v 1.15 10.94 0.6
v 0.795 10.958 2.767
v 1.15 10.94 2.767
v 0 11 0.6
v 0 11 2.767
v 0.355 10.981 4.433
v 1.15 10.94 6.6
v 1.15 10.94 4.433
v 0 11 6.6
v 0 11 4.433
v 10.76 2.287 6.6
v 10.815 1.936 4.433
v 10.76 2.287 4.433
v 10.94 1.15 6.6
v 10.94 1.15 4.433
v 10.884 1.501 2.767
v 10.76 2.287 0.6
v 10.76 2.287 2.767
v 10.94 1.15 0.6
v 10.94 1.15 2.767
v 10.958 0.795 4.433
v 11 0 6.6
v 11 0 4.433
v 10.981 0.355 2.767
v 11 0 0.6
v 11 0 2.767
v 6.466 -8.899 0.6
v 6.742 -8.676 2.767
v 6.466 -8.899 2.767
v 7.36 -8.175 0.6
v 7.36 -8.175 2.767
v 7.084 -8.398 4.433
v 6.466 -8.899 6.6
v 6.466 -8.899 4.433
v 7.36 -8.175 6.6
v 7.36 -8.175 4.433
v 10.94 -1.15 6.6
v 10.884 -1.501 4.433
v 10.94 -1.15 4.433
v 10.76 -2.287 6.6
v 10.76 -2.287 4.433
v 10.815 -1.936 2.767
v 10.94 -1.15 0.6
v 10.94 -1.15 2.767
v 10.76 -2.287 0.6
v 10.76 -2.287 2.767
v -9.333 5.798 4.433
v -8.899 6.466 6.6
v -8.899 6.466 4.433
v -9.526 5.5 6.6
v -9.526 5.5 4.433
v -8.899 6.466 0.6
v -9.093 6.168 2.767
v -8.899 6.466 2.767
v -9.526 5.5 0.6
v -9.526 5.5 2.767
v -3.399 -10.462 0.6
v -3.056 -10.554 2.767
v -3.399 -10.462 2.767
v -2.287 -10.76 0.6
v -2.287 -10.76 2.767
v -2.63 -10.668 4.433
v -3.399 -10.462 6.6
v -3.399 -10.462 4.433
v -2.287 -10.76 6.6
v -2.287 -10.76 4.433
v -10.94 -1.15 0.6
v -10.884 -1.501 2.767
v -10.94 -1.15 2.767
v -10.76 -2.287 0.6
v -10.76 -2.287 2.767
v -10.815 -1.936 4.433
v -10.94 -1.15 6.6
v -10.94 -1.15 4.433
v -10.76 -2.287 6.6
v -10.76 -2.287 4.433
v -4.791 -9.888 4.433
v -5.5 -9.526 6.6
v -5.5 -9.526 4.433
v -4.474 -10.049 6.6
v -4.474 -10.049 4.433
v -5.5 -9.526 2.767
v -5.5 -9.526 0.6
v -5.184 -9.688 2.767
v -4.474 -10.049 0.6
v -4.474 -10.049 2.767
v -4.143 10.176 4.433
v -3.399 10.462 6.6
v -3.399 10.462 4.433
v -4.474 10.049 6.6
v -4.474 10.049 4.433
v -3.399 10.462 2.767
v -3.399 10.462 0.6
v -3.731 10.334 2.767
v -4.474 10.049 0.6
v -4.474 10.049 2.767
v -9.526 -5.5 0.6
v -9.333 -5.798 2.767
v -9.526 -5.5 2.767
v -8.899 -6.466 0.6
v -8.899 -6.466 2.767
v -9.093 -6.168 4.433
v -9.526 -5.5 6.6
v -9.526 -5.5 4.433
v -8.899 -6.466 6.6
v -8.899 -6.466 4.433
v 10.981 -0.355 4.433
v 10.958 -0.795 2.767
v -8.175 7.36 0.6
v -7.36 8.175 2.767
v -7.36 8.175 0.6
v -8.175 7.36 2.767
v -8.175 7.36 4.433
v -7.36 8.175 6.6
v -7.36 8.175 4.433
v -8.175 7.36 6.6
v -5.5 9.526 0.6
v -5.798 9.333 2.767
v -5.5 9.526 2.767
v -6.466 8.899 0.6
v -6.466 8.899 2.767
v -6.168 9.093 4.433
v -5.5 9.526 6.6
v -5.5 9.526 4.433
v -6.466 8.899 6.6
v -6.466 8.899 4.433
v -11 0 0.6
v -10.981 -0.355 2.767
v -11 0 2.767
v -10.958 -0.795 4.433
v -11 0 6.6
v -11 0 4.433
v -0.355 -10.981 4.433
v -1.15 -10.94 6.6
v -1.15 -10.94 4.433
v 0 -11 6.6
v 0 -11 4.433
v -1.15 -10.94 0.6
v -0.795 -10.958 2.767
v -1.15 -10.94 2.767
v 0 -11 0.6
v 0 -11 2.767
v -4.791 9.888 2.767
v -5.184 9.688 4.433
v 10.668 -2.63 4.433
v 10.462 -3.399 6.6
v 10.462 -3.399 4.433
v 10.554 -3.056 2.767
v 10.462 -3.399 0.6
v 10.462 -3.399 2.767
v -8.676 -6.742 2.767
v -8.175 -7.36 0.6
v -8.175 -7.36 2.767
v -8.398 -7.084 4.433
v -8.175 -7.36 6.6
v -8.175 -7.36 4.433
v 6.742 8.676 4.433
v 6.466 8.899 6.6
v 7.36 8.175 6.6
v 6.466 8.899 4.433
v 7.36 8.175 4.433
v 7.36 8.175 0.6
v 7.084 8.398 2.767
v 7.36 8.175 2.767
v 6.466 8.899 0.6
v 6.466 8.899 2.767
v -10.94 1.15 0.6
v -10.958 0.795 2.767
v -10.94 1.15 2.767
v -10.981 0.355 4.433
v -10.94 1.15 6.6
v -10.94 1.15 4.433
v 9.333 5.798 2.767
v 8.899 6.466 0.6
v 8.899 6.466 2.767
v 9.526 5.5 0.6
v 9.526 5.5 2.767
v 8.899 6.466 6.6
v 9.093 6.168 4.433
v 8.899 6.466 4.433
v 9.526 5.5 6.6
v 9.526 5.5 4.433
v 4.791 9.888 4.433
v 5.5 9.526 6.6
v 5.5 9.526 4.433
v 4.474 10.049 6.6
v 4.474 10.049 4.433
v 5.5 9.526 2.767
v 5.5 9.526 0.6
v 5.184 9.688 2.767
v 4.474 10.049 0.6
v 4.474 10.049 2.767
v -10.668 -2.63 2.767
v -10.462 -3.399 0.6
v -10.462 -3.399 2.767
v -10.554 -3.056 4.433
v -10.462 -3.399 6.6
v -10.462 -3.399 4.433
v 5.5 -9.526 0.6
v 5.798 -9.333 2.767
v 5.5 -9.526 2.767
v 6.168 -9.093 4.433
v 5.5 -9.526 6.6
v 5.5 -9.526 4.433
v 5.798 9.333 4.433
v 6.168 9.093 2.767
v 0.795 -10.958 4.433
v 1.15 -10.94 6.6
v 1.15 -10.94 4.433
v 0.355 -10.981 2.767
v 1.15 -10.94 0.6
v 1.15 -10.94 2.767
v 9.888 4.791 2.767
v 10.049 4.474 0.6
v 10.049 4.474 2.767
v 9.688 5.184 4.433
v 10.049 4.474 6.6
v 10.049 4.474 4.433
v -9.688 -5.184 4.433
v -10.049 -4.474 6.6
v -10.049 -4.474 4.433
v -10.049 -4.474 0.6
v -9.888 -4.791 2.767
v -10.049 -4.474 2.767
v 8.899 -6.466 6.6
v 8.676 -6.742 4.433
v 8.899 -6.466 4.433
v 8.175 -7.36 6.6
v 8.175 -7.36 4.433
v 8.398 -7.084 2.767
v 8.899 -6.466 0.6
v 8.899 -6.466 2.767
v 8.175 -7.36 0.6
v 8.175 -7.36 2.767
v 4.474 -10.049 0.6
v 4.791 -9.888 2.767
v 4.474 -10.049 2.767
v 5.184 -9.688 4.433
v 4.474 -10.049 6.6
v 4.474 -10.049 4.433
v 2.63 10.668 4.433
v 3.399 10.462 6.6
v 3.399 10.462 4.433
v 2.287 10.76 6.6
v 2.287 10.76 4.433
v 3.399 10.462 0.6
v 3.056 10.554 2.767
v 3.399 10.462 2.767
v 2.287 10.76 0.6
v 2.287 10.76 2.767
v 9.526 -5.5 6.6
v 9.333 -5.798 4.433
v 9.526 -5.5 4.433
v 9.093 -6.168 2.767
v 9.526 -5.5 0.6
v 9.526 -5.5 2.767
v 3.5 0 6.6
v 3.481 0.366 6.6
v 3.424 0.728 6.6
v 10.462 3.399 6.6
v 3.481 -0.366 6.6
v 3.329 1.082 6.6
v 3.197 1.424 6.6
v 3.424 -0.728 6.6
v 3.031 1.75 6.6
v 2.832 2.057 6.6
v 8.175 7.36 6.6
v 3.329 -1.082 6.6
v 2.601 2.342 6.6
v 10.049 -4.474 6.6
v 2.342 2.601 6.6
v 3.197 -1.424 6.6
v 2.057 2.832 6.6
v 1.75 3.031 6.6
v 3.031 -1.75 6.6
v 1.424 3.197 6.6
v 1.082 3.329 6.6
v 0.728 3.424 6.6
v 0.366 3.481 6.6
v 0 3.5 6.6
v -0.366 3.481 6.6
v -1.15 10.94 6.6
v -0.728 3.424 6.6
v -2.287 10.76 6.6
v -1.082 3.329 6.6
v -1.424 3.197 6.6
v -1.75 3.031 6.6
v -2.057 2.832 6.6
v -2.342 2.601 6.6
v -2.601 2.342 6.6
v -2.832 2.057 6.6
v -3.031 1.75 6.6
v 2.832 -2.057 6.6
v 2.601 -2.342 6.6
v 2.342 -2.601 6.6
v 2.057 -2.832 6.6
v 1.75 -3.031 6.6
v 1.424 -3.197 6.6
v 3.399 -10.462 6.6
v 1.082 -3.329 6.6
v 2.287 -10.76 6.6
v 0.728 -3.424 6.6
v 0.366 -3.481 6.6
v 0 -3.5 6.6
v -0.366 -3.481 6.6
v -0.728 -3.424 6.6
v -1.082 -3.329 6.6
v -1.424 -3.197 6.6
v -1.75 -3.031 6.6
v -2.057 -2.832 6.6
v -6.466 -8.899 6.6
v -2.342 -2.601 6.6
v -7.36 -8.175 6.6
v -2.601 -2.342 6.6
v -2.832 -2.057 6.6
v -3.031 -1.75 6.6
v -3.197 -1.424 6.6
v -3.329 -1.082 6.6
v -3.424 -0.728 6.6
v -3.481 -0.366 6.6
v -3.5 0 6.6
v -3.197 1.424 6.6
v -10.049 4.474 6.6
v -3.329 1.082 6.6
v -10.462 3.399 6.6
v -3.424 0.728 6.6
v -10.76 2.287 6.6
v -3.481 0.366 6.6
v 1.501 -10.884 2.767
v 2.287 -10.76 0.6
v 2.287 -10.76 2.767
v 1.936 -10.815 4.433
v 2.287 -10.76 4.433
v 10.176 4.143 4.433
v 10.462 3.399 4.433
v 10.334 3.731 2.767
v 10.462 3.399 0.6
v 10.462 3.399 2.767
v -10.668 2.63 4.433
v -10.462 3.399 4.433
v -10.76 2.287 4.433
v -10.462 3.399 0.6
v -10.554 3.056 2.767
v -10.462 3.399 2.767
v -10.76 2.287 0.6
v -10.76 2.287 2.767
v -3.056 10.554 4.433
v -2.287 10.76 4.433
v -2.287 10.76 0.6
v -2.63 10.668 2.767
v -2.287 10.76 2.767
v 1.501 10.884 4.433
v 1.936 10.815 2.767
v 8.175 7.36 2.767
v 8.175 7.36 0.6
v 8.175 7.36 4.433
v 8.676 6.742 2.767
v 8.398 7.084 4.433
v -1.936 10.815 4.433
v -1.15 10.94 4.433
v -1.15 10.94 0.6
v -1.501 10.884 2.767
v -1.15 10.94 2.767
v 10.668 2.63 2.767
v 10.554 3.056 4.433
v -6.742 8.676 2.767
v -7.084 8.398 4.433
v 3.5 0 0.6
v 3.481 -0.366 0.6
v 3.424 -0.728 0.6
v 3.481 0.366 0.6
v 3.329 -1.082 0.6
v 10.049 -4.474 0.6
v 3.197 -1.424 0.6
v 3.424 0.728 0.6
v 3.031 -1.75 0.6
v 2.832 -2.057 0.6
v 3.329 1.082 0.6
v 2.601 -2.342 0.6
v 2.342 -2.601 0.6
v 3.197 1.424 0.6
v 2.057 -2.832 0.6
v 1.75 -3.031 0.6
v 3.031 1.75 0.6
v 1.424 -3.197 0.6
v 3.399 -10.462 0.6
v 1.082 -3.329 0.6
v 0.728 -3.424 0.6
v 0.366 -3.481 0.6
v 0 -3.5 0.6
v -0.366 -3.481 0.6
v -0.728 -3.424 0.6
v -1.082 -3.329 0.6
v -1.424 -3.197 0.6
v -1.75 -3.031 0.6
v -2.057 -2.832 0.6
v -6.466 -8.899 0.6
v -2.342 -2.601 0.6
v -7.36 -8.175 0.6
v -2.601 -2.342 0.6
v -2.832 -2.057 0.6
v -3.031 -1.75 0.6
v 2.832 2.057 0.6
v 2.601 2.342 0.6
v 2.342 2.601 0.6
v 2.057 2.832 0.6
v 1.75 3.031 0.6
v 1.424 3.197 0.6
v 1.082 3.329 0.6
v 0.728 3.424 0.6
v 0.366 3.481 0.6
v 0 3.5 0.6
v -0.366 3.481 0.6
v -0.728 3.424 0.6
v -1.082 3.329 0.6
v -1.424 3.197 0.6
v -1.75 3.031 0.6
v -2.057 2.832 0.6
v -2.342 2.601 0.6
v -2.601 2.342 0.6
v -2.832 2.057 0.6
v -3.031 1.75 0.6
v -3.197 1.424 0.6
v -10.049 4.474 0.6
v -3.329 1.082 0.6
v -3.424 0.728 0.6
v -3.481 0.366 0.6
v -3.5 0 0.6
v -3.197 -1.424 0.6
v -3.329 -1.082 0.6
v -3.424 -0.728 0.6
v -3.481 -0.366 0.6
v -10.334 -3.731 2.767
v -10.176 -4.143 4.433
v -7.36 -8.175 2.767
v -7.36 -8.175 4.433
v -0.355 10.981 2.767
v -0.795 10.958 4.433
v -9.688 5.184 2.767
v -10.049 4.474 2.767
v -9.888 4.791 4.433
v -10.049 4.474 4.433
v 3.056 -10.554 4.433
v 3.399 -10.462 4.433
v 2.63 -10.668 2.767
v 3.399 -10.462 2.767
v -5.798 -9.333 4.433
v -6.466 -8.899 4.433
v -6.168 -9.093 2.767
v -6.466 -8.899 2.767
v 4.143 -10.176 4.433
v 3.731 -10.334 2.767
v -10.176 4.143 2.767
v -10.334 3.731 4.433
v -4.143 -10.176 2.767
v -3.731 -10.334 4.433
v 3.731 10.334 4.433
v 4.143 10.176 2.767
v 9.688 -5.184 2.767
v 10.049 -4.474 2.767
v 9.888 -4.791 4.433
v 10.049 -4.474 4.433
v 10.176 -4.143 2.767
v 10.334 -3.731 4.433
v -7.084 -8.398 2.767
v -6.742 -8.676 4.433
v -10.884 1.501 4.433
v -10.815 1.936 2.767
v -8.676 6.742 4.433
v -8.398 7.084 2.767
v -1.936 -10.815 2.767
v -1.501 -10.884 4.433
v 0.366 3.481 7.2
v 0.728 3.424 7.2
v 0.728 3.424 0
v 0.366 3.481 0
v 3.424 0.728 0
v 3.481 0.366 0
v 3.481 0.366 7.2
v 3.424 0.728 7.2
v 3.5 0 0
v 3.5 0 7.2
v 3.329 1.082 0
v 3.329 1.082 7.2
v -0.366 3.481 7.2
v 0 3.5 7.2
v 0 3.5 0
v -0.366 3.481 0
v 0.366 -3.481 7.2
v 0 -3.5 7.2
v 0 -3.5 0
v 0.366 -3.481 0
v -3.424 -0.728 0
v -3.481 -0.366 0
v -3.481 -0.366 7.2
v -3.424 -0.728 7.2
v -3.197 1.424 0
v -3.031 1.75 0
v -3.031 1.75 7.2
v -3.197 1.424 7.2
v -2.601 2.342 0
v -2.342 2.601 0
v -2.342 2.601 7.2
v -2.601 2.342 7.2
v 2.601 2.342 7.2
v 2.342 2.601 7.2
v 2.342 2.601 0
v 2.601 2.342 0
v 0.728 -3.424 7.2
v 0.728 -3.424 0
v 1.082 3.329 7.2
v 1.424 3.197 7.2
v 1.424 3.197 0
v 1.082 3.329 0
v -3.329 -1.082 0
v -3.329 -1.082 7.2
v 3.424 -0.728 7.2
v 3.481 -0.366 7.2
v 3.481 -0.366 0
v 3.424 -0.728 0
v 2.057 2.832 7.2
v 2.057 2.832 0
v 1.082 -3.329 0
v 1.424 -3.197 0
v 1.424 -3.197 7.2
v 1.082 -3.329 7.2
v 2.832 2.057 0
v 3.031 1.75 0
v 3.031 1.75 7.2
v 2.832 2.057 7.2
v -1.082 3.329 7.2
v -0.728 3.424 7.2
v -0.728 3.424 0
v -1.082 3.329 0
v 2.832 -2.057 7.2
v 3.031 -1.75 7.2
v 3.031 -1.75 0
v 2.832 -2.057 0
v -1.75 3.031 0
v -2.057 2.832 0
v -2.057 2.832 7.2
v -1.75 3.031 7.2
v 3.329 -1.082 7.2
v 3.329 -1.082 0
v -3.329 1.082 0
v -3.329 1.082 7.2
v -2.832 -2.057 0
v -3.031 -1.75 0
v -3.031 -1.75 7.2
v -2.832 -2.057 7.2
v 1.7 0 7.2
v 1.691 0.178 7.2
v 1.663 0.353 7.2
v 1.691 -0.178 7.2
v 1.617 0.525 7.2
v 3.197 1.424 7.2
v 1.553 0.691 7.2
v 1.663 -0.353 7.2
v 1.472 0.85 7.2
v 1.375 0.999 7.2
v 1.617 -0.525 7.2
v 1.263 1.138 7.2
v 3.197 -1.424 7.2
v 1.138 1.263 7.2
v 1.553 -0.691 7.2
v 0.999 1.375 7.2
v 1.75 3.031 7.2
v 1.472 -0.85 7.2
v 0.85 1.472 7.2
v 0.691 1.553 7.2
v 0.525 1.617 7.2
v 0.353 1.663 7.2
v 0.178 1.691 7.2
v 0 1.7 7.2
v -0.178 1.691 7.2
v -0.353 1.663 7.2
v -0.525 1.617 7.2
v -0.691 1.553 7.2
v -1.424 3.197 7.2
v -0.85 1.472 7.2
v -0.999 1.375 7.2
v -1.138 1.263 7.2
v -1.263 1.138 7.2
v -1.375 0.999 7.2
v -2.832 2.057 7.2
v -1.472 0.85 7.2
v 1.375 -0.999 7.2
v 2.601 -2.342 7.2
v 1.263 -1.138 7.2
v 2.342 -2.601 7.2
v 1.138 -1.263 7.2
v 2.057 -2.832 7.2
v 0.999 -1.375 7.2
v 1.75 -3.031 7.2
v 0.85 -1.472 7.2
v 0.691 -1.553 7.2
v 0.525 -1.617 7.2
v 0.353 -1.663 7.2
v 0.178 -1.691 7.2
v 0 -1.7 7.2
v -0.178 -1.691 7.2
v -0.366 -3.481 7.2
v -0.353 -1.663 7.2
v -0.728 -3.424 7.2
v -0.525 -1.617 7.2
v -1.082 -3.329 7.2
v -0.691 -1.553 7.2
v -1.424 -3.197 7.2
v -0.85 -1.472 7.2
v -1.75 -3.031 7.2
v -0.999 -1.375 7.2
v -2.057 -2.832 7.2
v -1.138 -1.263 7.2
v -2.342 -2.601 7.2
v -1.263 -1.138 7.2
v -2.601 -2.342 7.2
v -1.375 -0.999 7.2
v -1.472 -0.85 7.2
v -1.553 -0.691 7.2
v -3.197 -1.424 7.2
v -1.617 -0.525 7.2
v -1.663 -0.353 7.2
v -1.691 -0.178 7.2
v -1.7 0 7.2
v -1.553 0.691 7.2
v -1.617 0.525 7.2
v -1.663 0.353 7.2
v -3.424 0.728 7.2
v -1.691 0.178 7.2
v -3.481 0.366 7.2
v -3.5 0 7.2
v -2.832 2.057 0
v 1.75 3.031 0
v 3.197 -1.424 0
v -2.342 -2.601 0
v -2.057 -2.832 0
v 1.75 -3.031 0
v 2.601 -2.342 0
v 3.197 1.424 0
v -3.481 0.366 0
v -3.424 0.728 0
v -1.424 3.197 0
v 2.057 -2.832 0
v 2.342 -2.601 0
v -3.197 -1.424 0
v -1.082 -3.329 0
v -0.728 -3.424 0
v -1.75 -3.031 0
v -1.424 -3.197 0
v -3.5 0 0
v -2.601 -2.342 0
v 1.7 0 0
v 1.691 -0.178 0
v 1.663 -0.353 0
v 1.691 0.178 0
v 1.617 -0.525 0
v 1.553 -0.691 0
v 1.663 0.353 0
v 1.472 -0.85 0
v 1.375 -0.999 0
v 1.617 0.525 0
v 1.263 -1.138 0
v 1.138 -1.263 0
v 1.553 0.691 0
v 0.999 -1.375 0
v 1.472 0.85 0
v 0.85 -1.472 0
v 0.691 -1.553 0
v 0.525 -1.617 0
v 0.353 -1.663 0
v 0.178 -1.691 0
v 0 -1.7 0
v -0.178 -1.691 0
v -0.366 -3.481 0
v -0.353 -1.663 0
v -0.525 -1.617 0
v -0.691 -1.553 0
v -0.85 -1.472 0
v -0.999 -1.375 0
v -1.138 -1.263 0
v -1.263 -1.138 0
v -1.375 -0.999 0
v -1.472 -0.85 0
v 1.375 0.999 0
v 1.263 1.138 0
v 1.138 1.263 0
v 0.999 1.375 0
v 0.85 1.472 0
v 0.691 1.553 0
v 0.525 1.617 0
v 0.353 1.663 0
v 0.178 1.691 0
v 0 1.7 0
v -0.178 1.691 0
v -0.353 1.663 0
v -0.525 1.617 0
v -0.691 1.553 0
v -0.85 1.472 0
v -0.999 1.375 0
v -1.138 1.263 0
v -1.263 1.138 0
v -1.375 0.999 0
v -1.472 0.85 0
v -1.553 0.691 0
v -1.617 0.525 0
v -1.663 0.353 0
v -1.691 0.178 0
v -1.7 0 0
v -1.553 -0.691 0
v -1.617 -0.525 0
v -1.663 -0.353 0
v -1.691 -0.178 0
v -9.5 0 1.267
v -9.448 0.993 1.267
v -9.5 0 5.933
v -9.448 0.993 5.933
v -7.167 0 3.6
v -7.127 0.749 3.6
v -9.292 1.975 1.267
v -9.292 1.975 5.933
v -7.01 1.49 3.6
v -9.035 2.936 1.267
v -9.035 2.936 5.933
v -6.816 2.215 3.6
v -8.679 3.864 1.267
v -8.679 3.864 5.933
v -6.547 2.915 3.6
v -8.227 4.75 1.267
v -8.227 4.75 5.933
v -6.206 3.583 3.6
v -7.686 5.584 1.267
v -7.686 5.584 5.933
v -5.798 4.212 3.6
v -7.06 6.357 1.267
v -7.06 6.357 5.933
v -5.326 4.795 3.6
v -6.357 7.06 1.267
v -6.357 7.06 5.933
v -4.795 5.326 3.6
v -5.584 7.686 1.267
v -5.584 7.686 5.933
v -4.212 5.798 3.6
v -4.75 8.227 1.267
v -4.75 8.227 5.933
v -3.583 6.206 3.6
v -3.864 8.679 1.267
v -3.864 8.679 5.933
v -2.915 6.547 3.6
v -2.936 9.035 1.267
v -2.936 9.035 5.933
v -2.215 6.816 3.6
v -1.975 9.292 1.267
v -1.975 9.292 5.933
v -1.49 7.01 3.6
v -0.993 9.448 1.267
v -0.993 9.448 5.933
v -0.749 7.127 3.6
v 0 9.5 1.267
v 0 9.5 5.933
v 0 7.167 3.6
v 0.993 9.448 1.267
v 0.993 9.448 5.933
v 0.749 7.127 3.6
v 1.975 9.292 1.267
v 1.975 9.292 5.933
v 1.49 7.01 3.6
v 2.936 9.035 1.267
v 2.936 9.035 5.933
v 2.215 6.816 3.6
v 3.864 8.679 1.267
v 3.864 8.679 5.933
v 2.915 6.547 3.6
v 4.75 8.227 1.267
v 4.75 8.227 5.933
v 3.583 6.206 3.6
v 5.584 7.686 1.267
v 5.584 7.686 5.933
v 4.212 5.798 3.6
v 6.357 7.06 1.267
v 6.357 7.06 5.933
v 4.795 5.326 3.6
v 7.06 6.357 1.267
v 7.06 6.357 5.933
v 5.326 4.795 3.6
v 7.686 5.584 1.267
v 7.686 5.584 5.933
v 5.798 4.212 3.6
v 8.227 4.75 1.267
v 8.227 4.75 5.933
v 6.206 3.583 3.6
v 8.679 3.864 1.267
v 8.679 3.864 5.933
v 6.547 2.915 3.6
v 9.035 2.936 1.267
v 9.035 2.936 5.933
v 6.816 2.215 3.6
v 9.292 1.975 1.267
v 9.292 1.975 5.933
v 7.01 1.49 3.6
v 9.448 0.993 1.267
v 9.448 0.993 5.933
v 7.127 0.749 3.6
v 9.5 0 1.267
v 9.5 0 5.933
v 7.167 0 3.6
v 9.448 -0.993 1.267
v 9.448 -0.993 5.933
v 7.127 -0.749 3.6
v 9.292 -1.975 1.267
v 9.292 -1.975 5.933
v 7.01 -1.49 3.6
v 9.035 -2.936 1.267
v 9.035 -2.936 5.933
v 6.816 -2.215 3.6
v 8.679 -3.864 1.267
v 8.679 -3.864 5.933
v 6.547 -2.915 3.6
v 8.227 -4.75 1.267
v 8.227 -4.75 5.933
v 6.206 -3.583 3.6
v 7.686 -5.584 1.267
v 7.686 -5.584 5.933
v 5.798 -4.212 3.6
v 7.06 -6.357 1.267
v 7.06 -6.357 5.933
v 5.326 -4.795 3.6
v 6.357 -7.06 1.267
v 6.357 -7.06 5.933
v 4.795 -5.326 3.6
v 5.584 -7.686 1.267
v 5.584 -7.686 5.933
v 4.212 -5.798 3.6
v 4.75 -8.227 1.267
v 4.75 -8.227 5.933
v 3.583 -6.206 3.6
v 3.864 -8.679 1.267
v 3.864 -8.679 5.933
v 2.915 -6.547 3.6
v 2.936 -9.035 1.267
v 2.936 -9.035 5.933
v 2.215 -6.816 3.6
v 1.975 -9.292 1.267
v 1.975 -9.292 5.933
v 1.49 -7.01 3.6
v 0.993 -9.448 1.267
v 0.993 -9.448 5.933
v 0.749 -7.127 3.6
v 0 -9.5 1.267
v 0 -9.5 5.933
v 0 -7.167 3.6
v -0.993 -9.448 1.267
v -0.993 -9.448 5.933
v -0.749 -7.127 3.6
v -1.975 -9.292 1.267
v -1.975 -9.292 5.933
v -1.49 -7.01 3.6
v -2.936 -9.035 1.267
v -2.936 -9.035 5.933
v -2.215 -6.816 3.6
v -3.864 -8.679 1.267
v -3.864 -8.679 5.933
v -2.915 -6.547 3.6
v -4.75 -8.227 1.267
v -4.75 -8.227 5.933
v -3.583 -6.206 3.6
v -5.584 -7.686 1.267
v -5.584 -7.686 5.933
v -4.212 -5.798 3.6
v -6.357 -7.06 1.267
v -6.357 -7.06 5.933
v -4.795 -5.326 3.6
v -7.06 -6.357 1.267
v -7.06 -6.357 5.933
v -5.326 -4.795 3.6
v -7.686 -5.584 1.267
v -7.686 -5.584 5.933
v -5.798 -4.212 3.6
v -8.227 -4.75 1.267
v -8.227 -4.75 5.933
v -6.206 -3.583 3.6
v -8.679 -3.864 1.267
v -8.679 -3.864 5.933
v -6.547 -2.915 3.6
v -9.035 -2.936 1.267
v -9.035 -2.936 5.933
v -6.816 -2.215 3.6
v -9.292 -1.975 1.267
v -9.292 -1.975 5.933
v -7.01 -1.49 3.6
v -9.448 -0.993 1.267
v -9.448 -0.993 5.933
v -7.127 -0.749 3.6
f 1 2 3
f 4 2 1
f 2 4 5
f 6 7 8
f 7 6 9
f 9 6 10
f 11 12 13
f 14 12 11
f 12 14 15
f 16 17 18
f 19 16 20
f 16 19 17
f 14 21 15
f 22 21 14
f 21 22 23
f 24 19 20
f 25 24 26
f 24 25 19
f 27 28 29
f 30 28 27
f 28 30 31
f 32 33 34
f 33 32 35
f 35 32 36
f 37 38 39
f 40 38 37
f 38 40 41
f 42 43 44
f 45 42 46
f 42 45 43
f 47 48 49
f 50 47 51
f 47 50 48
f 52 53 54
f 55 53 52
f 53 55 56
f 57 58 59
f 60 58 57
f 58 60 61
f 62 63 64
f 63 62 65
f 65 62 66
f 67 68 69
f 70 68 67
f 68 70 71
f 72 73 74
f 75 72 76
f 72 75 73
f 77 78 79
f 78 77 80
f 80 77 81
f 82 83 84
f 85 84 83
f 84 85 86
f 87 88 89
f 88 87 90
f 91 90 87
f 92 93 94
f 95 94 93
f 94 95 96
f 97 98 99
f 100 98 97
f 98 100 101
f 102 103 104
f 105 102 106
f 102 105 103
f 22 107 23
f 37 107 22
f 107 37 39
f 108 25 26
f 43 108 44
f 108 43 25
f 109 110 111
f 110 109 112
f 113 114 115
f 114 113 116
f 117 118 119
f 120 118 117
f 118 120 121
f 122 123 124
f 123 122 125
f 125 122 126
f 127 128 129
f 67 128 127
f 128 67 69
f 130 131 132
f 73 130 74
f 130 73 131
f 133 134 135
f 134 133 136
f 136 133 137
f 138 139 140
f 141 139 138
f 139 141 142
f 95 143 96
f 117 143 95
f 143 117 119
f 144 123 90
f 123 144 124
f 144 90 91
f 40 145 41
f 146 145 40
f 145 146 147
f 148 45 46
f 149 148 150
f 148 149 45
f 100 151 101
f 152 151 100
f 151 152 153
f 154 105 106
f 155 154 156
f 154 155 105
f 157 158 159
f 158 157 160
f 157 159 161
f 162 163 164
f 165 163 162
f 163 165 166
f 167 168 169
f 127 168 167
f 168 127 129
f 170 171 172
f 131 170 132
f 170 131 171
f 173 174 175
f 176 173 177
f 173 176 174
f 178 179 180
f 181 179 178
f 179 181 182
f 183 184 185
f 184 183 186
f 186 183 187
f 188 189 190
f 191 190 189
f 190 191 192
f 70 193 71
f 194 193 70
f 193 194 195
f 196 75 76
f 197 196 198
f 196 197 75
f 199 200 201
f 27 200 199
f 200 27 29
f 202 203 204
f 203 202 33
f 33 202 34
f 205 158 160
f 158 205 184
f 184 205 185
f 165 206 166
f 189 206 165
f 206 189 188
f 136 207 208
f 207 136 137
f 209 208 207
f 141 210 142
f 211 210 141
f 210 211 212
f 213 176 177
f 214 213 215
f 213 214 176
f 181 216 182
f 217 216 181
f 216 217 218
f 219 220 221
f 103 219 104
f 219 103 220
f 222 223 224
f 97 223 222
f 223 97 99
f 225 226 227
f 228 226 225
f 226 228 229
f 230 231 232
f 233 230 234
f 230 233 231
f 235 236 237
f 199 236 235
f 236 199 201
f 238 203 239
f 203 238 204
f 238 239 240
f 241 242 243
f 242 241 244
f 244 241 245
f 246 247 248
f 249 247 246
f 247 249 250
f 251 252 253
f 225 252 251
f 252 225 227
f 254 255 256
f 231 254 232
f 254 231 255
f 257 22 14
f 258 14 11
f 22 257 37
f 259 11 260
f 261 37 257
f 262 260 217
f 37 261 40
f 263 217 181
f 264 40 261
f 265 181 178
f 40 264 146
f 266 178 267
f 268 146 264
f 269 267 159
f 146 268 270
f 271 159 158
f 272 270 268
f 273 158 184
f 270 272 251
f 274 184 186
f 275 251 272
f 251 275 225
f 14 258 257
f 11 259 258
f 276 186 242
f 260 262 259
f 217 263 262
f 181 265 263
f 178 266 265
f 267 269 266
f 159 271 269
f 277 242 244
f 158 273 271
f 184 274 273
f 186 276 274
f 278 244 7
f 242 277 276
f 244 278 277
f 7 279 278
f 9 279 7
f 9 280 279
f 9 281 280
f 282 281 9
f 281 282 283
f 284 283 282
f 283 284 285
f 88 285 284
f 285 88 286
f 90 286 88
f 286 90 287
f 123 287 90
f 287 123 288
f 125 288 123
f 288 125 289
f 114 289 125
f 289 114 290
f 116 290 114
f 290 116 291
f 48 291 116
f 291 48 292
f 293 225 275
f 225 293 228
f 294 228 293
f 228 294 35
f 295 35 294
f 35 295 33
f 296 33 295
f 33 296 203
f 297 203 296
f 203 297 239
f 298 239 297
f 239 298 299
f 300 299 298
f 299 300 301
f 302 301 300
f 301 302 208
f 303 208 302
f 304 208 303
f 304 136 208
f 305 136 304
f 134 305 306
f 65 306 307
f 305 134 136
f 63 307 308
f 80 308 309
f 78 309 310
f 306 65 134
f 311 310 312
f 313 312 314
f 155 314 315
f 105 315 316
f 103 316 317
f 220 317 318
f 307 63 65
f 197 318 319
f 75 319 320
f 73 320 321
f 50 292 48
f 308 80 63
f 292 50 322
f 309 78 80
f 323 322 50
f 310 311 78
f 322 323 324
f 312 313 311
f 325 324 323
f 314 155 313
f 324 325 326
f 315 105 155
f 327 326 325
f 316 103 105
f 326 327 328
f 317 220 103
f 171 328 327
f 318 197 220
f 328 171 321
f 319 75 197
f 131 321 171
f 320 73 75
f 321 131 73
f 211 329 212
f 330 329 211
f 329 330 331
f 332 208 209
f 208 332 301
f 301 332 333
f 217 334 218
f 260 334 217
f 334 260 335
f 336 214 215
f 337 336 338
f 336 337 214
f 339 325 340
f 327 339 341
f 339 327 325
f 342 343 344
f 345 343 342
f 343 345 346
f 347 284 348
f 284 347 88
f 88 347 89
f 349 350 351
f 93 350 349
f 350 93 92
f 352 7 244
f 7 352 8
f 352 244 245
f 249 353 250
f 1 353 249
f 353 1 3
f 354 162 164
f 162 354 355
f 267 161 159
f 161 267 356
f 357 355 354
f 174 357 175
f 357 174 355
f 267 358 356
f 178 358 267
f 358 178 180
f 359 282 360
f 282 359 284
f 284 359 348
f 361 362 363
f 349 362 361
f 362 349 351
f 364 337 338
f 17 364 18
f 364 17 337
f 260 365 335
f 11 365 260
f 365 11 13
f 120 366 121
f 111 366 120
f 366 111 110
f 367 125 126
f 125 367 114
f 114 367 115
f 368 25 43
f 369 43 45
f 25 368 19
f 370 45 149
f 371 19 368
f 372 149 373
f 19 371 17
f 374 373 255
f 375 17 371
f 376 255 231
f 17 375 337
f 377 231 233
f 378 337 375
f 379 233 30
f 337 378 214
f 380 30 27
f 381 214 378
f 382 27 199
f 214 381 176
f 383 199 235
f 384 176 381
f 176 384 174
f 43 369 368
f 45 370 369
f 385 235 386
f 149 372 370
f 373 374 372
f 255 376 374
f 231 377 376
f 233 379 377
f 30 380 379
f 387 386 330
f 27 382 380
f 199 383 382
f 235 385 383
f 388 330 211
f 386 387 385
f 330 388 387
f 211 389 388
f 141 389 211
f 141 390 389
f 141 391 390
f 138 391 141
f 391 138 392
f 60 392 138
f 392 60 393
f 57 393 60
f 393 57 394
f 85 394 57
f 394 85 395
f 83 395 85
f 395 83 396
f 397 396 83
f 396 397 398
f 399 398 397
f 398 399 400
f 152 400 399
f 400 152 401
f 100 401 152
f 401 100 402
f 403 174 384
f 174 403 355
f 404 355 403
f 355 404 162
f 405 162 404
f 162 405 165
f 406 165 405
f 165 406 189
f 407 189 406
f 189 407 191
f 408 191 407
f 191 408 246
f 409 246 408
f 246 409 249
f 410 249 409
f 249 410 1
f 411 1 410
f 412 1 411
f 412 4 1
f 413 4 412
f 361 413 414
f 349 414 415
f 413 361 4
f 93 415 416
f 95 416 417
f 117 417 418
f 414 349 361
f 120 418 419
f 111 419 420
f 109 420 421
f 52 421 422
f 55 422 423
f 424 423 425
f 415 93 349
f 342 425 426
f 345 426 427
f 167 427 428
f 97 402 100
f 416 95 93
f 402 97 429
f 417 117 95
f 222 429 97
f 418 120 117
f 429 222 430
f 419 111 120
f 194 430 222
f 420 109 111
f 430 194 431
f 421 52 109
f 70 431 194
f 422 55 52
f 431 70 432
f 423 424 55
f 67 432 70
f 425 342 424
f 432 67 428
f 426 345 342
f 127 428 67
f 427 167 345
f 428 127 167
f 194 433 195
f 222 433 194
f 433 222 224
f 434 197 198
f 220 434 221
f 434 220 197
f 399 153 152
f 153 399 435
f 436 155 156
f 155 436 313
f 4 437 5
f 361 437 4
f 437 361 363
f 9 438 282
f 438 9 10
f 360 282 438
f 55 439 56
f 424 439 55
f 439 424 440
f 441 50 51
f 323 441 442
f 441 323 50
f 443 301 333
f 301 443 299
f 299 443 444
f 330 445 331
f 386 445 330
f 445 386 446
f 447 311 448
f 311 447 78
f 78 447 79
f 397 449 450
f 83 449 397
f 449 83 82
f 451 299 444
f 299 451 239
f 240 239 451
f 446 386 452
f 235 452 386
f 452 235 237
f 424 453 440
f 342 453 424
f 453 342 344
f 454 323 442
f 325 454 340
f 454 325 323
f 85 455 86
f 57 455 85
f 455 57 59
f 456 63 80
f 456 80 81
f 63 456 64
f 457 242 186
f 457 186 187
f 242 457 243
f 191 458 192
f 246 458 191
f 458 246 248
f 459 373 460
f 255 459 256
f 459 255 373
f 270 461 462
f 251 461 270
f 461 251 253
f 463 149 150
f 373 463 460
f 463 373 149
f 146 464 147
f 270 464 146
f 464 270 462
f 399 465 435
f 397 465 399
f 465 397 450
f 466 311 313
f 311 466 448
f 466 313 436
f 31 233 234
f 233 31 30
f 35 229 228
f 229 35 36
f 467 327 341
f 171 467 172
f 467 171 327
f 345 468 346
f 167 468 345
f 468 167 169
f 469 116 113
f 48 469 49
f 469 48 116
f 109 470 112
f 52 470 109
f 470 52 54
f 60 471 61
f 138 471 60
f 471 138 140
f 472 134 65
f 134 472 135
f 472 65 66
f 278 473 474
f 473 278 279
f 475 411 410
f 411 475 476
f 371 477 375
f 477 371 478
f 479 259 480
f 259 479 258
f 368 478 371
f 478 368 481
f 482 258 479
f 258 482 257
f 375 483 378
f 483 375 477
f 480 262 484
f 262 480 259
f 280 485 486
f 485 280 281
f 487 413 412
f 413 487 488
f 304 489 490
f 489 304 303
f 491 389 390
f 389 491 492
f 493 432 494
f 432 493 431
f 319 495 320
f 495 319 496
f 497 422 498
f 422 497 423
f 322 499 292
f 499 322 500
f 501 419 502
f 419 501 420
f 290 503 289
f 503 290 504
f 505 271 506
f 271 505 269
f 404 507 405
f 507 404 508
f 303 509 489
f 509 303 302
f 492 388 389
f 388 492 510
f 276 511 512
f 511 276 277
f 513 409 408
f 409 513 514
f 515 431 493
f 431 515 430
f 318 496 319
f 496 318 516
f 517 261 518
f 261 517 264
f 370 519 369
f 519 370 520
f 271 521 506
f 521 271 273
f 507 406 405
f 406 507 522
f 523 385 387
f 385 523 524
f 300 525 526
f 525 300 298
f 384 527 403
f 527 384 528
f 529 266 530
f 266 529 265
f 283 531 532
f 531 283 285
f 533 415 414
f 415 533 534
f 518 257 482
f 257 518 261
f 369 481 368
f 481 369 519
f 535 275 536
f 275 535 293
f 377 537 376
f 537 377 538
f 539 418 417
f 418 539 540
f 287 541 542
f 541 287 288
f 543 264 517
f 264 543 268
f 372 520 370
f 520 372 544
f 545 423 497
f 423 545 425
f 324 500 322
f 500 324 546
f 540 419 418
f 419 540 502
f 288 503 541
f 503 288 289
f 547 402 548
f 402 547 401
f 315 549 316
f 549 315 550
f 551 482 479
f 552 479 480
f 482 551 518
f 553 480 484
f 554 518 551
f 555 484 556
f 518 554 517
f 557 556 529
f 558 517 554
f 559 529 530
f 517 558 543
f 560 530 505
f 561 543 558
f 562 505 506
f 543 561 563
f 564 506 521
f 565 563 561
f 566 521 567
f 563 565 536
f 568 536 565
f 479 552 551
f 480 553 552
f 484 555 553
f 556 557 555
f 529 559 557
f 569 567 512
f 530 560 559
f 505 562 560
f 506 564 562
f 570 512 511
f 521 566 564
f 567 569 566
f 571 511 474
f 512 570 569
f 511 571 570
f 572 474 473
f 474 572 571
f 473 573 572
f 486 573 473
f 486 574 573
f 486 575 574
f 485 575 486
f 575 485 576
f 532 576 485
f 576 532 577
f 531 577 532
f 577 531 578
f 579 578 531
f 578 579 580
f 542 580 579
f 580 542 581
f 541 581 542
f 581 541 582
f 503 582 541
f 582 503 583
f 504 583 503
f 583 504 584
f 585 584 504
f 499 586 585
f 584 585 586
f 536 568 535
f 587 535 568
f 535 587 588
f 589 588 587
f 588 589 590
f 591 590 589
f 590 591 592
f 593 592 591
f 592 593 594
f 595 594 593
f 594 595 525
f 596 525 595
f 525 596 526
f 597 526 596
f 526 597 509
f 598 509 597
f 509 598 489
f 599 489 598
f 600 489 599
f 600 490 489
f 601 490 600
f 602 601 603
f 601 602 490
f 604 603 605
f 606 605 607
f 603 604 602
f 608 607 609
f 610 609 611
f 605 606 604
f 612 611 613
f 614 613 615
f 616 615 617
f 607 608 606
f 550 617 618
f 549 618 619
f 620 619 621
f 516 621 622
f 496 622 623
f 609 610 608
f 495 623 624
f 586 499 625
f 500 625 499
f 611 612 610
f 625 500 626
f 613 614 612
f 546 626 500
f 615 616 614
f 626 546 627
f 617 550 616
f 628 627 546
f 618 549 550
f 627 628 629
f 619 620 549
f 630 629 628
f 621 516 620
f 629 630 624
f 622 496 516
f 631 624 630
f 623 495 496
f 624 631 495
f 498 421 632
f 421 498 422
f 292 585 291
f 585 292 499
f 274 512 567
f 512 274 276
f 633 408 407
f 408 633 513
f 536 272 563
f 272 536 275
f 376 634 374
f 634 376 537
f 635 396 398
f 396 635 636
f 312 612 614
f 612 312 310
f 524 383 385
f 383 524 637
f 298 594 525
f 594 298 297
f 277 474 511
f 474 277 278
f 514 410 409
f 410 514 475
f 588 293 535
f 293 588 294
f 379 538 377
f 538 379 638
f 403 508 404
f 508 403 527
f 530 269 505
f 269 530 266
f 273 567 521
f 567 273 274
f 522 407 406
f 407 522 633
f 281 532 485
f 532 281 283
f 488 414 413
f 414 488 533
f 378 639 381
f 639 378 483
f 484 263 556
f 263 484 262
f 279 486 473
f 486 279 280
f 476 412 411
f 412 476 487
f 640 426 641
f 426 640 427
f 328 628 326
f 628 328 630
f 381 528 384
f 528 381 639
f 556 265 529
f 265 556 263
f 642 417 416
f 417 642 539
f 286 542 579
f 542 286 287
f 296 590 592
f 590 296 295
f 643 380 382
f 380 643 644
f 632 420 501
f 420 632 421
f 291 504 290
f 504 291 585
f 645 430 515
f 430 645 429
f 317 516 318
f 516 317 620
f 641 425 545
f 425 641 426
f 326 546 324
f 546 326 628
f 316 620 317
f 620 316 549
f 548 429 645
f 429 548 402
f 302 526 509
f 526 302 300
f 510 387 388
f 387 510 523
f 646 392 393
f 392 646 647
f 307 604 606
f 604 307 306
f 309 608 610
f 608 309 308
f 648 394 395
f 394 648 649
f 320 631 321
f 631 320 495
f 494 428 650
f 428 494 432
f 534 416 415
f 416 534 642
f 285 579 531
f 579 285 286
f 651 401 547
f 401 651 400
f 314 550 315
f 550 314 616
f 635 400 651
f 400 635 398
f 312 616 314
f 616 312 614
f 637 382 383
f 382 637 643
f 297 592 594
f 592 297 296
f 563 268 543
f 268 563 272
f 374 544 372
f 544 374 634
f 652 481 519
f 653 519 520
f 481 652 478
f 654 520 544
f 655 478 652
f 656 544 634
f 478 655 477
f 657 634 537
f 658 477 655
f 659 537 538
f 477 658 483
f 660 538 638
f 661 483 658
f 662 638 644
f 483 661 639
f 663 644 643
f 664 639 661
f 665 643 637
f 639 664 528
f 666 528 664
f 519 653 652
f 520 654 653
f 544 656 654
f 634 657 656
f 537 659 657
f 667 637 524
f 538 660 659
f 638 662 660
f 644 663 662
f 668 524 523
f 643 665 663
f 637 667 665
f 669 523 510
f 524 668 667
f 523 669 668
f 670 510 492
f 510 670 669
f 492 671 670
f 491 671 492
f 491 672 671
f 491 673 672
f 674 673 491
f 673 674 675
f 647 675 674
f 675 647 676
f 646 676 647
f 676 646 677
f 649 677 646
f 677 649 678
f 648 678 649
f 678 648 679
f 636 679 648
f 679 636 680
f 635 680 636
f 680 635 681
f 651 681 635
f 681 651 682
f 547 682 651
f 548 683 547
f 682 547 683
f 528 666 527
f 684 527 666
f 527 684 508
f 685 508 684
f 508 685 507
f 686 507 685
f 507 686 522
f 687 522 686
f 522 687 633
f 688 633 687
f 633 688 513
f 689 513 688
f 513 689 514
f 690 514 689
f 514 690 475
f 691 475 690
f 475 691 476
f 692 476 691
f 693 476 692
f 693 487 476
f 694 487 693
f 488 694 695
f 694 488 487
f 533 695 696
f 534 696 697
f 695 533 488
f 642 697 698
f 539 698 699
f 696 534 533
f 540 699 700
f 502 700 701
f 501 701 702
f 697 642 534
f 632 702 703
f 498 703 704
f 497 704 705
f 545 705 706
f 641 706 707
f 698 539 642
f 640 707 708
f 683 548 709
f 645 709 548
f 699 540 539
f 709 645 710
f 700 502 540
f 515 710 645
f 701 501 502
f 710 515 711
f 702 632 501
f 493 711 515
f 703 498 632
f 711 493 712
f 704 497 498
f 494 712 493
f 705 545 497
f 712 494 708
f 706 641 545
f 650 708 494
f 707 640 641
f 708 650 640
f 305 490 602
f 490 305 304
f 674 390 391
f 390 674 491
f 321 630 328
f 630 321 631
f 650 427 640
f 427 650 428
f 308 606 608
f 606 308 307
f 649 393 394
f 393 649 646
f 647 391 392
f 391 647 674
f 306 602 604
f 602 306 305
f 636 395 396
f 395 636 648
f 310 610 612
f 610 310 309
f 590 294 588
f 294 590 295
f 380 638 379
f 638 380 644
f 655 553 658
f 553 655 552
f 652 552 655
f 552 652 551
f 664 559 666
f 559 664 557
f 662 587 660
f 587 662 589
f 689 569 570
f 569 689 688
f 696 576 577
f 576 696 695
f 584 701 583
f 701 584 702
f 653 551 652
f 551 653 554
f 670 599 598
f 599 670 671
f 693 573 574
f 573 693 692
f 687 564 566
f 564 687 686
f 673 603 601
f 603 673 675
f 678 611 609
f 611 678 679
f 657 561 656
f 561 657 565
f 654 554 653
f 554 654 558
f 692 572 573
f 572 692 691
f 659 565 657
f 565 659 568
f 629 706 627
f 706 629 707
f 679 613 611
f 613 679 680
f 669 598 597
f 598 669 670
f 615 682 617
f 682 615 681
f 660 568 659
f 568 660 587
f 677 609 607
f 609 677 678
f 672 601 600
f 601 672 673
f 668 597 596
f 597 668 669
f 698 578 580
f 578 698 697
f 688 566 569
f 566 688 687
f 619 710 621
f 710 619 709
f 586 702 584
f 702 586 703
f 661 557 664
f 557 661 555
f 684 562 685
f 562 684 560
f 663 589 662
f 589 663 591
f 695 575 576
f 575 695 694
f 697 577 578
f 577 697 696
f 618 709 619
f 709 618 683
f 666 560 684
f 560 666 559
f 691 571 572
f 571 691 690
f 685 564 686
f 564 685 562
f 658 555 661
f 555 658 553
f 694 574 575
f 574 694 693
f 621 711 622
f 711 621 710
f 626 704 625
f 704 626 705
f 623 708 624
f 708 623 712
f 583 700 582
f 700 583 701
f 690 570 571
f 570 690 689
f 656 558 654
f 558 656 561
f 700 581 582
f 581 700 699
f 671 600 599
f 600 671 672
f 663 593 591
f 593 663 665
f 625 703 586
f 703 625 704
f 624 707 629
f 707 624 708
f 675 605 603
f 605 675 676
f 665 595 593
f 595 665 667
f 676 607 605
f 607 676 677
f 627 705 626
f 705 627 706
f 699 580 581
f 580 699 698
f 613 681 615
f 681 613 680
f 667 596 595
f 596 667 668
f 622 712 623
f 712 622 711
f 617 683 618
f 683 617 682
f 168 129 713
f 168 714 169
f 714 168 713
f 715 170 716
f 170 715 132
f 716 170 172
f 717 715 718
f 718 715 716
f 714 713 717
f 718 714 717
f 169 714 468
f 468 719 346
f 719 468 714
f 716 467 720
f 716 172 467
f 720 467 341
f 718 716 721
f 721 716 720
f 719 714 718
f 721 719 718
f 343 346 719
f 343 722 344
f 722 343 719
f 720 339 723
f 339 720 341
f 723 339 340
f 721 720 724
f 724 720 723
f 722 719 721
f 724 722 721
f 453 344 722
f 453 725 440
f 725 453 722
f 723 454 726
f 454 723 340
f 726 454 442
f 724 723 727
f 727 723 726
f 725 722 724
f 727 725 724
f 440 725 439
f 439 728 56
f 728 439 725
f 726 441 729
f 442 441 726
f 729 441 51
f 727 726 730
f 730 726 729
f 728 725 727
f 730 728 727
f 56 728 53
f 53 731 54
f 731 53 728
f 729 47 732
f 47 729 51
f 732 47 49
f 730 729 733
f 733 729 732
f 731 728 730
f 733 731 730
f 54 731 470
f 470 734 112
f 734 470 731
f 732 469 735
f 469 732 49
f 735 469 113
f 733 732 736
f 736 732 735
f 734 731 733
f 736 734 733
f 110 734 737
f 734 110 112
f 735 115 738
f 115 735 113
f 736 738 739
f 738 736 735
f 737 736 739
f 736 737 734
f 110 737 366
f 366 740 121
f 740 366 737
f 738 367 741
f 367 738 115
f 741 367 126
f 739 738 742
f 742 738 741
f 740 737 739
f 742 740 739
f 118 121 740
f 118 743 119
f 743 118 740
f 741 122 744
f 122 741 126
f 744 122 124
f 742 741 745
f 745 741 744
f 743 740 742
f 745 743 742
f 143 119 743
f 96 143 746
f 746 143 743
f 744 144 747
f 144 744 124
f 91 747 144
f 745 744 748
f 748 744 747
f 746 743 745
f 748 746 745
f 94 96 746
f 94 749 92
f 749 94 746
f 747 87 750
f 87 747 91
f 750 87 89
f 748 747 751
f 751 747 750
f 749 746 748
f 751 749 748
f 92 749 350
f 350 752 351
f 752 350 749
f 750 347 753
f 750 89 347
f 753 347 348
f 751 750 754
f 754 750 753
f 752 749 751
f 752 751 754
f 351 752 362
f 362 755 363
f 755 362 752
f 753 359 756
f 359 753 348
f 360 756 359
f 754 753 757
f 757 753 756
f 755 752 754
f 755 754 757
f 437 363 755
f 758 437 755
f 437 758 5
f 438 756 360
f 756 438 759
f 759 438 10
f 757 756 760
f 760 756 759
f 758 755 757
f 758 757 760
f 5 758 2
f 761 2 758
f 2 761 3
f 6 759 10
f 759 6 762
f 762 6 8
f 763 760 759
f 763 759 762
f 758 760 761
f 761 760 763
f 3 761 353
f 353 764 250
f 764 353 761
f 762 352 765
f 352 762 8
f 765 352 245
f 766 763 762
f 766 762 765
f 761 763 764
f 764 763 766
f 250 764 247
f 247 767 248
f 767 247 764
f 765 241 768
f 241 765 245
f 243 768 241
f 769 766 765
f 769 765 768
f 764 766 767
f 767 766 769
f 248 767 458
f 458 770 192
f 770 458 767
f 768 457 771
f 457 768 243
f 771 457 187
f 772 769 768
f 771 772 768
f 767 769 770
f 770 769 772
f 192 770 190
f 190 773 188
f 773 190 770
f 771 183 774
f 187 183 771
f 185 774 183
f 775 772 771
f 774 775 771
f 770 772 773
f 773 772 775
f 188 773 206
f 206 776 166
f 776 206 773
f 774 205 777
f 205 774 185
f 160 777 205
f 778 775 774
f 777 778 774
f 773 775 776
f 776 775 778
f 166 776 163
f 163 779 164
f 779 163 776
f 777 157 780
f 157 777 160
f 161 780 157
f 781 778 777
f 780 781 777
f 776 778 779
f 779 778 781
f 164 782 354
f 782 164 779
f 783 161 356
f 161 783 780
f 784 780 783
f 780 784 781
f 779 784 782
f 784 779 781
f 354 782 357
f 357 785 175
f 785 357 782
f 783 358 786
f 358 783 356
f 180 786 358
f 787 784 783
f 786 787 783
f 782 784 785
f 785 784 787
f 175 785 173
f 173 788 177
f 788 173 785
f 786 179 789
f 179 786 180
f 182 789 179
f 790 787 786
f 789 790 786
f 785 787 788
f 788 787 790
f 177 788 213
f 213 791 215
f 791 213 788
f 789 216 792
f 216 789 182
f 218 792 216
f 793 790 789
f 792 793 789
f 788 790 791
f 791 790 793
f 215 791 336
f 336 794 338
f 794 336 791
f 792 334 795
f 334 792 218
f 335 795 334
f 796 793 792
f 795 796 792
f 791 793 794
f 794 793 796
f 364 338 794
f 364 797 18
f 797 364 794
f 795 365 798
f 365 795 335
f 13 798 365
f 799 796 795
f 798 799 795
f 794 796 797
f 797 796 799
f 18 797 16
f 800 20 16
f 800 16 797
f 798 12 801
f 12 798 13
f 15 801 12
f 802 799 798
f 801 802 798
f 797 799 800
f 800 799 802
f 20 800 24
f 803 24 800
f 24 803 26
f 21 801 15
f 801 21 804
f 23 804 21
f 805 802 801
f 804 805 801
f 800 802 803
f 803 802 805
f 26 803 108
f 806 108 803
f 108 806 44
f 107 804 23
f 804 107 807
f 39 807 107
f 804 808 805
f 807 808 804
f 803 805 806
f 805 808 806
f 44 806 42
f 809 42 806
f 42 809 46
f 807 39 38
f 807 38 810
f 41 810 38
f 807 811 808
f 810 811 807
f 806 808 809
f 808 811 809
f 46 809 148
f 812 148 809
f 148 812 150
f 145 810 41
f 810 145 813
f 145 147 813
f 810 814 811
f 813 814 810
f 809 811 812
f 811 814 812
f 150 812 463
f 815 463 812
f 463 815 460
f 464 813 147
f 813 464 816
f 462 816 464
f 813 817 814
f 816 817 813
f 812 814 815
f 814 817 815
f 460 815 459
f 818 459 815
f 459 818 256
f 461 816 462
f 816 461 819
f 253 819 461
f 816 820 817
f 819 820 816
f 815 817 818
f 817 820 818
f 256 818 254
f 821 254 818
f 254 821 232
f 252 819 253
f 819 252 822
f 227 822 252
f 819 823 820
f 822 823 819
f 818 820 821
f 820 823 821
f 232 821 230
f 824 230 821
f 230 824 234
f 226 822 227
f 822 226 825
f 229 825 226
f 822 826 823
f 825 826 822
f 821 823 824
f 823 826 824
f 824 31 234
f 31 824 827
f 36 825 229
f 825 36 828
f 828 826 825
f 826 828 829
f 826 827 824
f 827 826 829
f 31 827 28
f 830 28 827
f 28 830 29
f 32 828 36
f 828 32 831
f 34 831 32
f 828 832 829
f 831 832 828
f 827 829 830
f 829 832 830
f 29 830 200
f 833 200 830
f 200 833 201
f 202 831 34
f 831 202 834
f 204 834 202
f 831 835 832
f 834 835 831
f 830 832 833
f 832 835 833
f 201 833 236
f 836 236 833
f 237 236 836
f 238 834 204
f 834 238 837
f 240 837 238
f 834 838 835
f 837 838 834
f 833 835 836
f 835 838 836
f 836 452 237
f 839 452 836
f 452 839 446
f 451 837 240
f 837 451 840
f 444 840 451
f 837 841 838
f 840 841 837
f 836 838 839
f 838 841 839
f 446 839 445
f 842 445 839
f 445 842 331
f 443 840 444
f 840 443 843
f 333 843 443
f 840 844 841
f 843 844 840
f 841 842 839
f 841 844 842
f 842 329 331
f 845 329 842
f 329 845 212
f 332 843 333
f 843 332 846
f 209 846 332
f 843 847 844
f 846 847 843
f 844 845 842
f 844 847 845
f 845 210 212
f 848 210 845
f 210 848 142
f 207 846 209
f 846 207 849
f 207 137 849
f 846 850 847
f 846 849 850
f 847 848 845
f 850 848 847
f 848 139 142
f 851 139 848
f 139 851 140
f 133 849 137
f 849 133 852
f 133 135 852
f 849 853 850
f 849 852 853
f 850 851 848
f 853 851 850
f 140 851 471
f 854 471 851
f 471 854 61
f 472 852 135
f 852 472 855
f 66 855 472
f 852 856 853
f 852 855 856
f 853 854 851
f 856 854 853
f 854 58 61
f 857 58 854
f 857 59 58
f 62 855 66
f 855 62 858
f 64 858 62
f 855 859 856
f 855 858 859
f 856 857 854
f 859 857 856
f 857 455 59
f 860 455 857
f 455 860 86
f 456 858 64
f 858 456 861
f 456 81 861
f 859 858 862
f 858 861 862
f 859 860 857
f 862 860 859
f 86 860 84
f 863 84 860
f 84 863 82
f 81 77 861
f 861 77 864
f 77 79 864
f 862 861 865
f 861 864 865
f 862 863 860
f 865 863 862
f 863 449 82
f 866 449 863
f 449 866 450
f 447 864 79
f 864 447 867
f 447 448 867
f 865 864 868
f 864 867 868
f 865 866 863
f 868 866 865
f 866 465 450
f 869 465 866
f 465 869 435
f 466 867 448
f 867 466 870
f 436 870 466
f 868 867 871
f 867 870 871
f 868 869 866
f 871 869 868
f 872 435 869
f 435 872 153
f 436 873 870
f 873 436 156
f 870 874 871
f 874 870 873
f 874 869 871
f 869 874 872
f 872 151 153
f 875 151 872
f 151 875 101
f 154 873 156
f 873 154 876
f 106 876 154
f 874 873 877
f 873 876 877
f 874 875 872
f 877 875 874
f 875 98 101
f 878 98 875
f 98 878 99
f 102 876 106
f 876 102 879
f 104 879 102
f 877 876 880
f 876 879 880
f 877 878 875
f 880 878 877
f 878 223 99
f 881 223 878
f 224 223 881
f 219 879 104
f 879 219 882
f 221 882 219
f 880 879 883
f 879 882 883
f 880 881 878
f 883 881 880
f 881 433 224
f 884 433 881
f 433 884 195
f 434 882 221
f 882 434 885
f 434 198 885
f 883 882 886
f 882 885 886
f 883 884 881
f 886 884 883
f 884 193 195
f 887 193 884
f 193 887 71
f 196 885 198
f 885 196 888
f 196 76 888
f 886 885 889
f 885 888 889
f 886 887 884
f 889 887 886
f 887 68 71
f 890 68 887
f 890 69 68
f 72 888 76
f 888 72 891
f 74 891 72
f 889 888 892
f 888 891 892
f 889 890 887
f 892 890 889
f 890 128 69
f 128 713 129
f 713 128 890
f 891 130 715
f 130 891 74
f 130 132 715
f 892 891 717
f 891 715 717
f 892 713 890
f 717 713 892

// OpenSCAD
// ====================================================================
// Trolley Roller Wheel (100% 3D-Printable - Flat on Bed at Z = 0)
// Grooved sheave designed to roll directly on a 1.0 - 2.0 mm cable line.
// Spins freely on a standard M3 or M4 screw / pin axle.
// ====================================================================

$fn = 60; // Smooth curve resolution

// Parameters
wheel_outer_dia   = 22.0; // Outer flange diameter (mm)
groove_root_dia   = 16.0; // Bottom of groove diameter (mm)
wheel_thickness   = 6.0;  // Total thickness along axle (mm)
groove_width      = 3.0;  // Width of cable track (mm)
axle_hole_dia     = 3.4;  // Fits standard M3 screw with clearance
hub_lip_extension = 0.6;  // Built-in standoff hub so wheel faces don't rub on carriage walls
hub_dia           = 7.0;  // Diameter of built-in standoff spacer

total_wheel_h = wheel_thickness + (hub_lip_extension * 2);

module trolley_wheel_body(od = wheel_outer_dia, root_d = groove_root_dia, th = wheel_thickness, axle_d = axle_hole_dia) {
    difference() {
        union() {
            // Main wheel body
            translate([0, 0, hub_lip_extension])
                cylinder(d = od, h = th);
            // Built-in hub spacers on both sides (starts at Z = 0)
            cylinder(d = hub_dia, h = th + (hub_lip_extension * 2));
        }
        
        // Central axle bore
        translate([0, 0, -1])
            cylinder(d = axle_d, h = th + (hub_lip_extension * 2) + 2);
        
        // Deep V/U Cable groove around the perimeter
        translate([0, 0, (th / 2) + hub_lip_extension])
            rotate_extrude(convexity = 10) {
                translate([root_d / 2 + (od - root_d) / 4, 0, 0])
                    rotate([0, 0, 45])
                        square([groove_width * 1.1, groove_width * 1.1], center = true);
            }
    }
}

module trolley_wheel() {
    trolley_wheel_body();
}

// Render single wheel flat on build plate at Z = 0
trolley_wheel();
